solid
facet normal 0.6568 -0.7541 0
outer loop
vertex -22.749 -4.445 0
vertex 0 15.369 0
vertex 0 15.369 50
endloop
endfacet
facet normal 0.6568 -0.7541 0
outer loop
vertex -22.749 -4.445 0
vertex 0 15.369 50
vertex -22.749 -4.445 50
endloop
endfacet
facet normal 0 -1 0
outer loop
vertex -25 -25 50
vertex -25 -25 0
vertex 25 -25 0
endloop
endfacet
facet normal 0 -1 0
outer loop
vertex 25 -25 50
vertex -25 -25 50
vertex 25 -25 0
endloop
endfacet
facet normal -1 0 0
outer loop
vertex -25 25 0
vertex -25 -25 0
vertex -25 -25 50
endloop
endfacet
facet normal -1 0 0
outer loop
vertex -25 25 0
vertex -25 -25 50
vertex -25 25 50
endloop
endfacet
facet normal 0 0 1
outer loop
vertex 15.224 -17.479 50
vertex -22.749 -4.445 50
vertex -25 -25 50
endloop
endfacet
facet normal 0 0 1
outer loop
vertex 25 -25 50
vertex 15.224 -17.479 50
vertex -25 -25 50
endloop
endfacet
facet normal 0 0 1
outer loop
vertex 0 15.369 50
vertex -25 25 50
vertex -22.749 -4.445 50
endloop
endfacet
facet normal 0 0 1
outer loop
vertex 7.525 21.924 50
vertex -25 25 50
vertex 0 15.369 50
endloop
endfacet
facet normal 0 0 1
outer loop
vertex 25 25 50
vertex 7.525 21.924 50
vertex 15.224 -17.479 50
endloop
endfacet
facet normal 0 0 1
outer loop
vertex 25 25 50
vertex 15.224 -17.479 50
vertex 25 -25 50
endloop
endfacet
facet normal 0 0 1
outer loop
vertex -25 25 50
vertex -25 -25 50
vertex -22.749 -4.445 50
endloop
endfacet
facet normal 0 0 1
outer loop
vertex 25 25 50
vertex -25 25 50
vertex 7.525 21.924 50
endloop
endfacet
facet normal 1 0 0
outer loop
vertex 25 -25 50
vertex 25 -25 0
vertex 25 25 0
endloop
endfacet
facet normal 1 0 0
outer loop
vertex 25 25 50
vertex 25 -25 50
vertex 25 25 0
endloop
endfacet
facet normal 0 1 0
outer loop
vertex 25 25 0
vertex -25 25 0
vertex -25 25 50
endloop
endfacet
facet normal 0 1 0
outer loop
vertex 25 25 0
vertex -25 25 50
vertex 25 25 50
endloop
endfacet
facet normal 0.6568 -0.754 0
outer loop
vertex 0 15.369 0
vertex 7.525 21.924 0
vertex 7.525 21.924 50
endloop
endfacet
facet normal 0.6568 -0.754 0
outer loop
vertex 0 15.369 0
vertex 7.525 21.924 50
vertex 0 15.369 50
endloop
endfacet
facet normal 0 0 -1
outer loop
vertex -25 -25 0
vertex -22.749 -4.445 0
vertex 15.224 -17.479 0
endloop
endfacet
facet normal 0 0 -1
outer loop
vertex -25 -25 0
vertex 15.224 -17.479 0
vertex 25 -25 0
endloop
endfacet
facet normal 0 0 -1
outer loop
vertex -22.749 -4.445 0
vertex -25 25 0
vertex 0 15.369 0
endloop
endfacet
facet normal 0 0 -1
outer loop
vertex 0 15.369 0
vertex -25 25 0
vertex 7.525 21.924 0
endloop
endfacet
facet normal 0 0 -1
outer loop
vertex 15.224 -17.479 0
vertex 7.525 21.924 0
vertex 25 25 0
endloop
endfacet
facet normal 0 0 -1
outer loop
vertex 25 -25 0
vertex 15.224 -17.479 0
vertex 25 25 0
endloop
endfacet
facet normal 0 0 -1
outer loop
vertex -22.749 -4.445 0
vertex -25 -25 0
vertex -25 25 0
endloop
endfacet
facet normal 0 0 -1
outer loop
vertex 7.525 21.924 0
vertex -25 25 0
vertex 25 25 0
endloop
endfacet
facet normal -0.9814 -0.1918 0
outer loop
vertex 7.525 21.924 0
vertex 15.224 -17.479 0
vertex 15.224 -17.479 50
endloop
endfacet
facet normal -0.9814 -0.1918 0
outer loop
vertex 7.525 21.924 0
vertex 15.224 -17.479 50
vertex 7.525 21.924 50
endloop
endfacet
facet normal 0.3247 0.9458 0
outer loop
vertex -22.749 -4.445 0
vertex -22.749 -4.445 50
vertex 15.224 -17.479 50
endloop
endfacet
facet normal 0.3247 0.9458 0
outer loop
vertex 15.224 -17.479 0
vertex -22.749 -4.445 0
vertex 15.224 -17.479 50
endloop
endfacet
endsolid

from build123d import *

# Parameters (mm, degrees)
F0_W     = 50
F0_H     = 50
F1_DEPTH = 50
F3_DEPTH = 55


with BuildPart() as f1:
    # F0 (on Top) → F1 (new body)
    with BuildSketch(Plane.XY):
        Rectangle(F0_W, F0_H)
    extrude(amount=F1_DEPTH)

    # F2 (on face) → F3 (cut)
    with BuildSketch(Plane.XY.offset(50)):
        Polygon((7.525486, 21.923712), (0, 15.369256), (-22.749234, -4.444594), (15.223748, -17.479118), align=None)
    extrude(amount=-F3_DEPTH, mode=Mode.SUBTRACT)


solid = f1.part
